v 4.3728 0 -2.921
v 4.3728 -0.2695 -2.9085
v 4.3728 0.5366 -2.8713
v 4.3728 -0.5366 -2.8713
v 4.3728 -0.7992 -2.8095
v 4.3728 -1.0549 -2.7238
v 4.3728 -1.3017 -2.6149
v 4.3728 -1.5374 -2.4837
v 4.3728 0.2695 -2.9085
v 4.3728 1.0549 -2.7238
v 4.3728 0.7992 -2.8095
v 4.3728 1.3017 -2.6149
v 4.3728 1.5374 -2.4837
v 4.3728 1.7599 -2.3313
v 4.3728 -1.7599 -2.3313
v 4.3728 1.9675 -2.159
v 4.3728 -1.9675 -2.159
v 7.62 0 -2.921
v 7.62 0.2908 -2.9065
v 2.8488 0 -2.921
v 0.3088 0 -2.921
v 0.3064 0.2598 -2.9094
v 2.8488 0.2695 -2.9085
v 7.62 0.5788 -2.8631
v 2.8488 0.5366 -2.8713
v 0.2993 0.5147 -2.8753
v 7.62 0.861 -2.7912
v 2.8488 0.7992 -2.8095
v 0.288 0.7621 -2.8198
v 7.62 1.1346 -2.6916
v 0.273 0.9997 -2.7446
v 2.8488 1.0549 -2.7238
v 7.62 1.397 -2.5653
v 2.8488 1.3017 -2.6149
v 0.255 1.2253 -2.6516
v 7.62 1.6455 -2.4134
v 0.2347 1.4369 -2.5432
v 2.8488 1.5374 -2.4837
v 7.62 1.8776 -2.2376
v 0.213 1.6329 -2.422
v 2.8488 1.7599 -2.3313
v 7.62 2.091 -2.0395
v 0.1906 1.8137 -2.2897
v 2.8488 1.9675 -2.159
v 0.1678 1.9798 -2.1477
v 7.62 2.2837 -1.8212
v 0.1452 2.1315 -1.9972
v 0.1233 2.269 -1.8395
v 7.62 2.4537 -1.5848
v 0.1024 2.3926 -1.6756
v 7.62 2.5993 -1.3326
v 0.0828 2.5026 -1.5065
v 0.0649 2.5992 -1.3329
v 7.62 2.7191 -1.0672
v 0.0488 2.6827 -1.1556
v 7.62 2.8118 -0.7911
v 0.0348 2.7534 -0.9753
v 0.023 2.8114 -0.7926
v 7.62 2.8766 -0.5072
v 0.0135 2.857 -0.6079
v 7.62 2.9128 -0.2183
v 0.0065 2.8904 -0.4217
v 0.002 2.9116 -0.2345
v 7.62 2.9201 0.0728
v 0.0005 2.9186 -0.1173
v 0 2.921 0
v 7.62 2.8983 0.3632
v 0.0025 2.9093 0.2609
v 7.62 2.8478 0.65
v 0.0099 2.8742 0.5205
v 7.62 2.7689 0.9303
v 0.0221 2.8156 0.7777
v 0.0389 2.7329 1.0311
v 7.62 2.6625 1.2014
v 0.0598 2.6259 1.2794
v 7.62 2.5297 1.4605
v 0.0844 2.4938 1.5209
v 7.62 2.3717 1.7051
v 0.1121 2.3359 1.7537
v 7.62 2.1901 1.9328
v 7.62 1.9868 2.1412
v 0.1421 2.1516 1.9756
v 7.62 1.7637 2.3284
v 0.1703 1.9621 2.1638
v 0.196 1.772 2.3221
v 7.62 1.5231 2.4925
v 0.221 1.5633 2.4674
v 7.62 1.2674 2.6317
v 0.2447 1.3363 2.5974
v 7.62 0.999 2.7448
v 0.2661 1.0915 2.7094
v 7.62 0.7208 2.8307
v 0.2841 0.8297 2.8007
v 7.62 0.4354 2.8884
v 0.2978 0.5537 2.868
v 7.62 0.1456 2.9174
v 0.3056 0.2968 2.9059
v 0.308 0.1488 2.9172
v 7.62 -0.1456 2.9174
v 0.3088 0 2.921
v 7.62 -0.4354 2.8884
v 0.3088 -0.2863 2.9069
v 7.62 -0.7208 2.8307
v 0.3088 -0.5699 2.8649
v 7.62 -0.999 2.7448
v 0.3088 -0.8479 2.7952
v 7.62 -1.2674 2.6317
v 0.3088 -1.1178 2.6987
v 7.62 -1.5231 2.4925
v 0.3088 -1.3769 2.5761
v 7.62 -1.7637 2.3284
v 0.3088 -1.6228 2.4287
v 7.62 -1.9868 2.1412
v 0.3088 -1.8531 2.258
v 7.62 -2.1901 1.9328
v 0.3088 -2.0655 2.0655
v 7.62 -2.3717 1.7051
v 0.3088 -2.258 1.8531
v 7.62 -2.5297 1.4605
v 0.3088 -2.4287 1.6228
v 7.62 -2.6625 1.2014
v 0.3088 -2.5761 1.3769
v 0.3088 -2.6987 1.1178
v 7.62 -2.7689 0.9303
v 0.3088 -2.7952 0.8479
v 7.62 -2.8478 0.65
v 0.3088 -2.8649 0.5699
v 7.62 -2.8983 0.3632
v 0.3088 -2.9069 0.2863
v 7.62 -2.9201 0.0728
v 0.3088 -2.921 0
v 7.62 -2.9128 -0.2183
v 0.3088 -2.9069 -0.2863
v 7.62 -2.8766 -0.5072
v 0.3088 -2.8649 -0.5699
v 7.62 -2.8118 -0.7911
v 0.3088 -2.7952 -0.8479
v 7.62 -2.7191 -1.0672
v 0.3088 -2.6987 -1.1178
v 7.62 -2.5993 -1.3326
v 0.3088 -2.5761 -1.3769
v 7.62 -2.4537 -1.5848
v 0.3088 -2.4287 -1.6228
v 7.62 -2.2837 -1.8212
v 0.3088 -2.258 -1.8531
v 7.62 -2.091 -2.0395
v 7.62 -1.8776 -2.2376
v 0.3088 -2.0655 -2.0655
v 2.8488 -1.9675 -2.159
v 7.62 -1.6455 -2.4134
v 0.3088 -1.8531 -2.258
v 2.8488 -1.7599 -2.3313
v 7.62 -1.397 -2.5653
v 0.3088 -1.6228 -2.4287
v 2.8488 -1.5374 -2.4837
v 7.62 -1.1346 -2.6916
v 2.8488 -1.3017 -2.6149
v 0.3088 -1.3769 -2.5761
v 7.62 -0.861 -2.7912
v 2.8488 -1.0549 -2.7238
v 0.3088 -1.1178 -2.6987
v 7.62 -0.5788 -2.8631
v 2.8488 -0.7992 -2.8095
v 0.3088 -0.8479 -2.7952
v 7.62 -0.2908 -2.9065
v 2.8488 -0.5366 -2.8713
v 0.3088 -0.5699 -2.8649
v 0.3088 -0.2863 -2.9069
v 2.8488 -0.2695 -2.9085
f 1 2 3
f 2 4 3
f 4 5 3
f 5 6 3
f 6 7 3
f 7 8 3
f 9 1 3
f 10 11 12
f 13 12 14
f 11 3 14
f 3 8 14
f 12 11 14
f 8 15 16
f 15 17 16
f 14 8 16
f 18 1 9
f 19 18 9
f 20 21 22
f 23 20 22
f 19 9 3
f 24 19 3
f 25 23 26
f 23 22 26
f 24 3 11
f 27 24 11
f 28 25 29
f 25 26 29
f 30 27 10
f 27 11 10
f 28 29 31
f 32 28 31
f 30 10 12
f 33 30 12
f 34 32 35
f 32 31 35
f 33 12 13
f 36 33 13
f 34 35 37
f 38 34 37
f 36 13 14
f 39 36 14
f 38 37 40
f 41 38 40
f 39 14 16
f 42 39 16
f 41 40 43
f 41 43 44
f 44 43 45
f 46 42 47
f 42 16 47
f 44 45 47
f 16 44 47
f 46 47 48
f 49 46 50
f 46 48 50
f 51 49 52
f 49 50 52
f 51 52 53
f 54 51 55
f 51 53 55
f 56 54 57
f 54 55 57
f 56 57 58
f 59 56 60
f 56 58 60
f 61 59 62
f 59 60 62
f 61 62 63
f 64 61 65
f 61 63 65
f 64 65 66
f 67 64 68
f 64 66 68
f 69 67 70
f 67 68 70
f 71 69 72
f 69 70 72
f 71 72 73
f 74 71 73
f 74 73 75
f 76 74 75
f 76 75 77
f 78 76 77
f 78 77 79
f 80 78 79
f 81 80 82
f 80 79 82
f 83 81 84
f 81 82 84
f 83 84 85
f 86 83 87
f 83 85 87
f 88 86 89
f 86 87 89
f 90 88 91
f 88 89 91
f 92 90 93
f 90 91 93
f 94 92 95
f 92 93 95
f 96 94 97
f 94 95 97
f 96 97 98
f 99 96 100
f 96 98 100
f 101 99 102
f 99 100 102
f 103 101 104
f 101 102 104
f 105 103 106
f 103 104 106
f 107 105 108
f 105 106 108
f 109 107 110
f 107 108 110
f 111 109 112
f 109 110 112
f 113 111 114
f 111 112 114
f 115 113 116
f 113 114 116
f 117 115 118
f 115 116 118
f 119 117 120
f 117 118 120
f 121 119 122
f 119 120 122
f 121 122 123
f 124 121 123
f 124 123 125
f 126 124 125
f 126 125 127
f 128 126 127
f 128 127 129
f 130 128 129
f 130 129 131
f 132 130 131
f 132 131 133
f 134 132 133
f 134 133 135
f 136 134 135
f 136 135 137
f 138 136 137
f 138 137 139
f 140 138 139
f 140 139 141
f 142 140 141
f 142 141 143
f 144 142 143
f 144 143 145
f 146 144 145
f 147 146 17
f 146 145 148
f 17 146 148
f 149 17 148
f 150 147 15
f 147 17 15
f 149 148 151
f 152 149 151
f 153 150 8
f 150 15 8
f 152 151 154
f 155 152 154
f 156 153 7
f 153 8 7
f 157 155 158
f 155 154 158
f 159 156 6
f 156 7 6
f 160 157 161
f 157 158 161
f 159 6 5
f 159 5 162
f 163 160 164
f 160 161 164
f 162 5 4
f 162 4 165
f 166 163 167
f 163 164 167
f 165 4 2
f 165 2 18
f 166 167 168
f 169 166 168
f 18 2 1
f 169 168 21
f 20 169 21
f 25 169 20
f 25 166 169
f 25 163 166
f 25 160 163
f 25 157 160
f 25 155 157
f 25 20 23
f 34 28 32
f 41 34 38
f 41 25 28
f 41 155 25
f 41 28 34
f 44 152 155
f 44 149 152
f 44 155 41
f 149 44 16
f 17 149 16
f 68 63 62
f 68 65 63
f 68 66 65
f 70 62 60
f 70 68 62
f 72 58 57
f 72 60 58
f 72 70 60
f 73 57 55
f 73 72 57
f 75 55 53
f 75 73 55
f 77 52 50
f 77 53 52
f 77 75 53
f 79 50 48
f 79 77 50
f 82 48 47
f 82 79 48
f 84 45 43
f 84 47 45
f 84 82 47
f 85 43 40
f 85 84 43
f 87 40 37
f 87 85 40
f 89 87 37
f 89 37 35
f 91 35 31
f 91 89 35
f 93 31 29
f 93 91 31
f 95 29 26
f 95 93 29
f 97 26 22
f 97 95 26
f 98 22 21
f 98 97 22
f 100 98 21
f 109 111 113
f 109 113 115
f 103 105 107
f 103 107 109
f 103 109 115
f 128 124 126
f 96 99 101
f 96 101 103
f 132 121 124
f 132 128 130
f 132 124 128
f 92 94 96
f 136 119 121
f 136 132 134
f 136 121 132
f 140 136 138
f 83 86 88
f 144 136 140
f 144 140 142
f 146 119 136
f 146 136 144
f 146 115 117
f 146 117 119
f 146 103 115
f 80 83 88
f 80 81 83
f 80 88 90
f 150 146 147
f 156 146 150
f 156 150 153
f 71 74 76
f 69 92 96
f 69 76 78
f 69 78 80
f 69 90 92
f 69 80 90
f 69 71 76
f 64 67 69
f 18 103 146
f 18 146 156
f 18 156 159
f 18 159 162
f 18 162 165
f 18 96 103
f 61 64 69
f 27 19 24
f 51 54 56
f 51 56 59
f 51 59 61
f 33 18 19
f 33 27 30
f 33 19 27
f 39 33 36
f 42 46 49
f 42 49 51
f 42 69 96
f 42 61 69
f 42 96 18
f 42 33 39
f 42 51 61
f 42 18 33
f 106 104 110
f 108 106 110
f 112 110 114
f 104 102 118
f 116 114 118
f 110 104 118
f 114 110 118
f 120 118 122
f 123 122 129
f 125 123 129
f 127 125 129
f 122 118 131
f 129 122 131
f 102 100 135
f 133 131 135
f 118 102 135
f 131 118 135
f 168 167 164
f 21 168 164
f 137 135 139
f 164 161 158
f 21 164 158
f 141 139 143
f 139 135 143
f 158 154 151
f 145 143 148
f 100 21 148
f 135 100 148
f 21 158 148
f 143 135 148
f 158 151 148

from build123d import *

# Parameters (mm, degrees)
SKETCH3_R                      = 2.921
BOSS_EXTRUDE2_DEPTH            = 7.62
CUT_EXTRUDE1_REACH             = 4.921
CUT_EXTRUDE1_DIRECTION_2_REACH = 4.921
CUT_EXTRUDE2_REACH             = 4.921
SKETCH5_W                      = 1.524
SKETCH5_H                      = 0.762
CUT_EXTRUDE2_DIRECTION_2_REACH = 4.921


with BuildPart() as part:
    # Sketch3 → Boss-Extrude2 (new body)
    with BuildSketch(Plane(origin=(0, 0, 0), x_dir=(0, 0, -1), z_dir=(1, 0, 0))):
        Circle(SKETCH3_R)
    extrude(amount=BOSS_EXTRUDE2_DEPTH)

    # Sketch4 → Cut-Extrude1 (cut, up to next)
    with BuildSketch(Plane.XY, mode=Mode.PRIVATE) as cut_extrude1_sk1:
        with BuildLine():
            Line((0.308789988, 0), (0.308789988, -2.921))
            Line((0.308789988, -2.921), (0, -2.921))
            Line((0, -2.921), (0, 2.921))
            ThreePointArc((0, 2.921), (0.231378009, 1.468638167), (0.308789988, 0))
        make_face()
    cut_extrude1_tool1 = extrude(cut_extrude1_sk1.sketch, amount=-CUT_EXTRUDE1_REACH, mode=Mode.PRIVATE) & part.part
    add(cut_extrude1_tool1.solids().sort_by_distance((0.142074, -0.436129, 0))[0], mode=Mode.SUBTRACT)

    # Sketch4 → Cut-Extrude1 direction 2 (cut, up to next)
    with BuildSketch(Plane.XY, mode=Mode.PRIVATE) as cut_extrude1_direction_2_sk1:
        with BuildLine():
            Line((0.308789988, 0), (0.308789988, -2.921))
            Line((0.308789988, -2.921), (0, -2.921))
            Line((0, -2.921), (0, 2.921))
            ThreePointArc((0, 2.921), (0.231378009, 1.468638167), (0.308789988, 0))
        make_face()
    cut_extrude1_direction_2_tool1 = extrude(cut_extrude1_direction_2_sk1.sketch, amount=CUT_EXTRUDE1_DIRECTION_2_REACH, mode=Mode.PRIVATE) & part.part
    add(cut_extrude1_direction_2_tool1.solids().sort_by_distance((0.142074, -0.436129, 0))[0], mode=Mode.SUBTRACT)

    # Sketch5 → Cut-Extrude2 (cut, up to next)
    with BuildSketch(Plane(origin=(0, 0, 0), x_dir=(1, 0, 0), z_dir=(0, 1, 0)), mode=Mode.PRIVATE) as cut_extrude2_sk1:
        with Locations((3.610789988, 2.54)):
            Rectangle(SKETCH5_W, SKETCH5_H)
    cut_extrude2_tool1 = extrude(cut_extrude2_sk1.sketch, amount=-CUT_EXTRUDE2_REACH, mode=Mode.PRIVATE) & part.part
    add(cut_extrude2_tool1.solids().sort_by_distance((3.61079, 0, -2.54))[0], mode=Mode.SUBTRACT)

    # Sketch5 → Cut-Extrude2 direction 2 (cut, up to next)
    with BuildSketch(Plane(origin=(0, 0, 0), x_dir=(1, 0, 0), z_dir=(0, 1, 0)), mode=Mode.PRIVATE) as cut_extrude2_direction_2_sk1:
        with Locations((3.610789988, 2.54)):
            Rectangle(SKETCH5_W, SKETCH5_H)
    cut_extrude2_direction_2_tool1 = extrude(cut_extrude2_direction_2_sk1.sketch, amount=CUT_EXTRUDE2_DIRECTION_2_REACH, mode=Mode.PRIVATE) & part.part
    add(cut_extrude2_direction_2_tool1.solids().sort_by_distance((3.61079, 0, -2.54))[0], mode=Mode.SUBTRACT)


solid = part.part
